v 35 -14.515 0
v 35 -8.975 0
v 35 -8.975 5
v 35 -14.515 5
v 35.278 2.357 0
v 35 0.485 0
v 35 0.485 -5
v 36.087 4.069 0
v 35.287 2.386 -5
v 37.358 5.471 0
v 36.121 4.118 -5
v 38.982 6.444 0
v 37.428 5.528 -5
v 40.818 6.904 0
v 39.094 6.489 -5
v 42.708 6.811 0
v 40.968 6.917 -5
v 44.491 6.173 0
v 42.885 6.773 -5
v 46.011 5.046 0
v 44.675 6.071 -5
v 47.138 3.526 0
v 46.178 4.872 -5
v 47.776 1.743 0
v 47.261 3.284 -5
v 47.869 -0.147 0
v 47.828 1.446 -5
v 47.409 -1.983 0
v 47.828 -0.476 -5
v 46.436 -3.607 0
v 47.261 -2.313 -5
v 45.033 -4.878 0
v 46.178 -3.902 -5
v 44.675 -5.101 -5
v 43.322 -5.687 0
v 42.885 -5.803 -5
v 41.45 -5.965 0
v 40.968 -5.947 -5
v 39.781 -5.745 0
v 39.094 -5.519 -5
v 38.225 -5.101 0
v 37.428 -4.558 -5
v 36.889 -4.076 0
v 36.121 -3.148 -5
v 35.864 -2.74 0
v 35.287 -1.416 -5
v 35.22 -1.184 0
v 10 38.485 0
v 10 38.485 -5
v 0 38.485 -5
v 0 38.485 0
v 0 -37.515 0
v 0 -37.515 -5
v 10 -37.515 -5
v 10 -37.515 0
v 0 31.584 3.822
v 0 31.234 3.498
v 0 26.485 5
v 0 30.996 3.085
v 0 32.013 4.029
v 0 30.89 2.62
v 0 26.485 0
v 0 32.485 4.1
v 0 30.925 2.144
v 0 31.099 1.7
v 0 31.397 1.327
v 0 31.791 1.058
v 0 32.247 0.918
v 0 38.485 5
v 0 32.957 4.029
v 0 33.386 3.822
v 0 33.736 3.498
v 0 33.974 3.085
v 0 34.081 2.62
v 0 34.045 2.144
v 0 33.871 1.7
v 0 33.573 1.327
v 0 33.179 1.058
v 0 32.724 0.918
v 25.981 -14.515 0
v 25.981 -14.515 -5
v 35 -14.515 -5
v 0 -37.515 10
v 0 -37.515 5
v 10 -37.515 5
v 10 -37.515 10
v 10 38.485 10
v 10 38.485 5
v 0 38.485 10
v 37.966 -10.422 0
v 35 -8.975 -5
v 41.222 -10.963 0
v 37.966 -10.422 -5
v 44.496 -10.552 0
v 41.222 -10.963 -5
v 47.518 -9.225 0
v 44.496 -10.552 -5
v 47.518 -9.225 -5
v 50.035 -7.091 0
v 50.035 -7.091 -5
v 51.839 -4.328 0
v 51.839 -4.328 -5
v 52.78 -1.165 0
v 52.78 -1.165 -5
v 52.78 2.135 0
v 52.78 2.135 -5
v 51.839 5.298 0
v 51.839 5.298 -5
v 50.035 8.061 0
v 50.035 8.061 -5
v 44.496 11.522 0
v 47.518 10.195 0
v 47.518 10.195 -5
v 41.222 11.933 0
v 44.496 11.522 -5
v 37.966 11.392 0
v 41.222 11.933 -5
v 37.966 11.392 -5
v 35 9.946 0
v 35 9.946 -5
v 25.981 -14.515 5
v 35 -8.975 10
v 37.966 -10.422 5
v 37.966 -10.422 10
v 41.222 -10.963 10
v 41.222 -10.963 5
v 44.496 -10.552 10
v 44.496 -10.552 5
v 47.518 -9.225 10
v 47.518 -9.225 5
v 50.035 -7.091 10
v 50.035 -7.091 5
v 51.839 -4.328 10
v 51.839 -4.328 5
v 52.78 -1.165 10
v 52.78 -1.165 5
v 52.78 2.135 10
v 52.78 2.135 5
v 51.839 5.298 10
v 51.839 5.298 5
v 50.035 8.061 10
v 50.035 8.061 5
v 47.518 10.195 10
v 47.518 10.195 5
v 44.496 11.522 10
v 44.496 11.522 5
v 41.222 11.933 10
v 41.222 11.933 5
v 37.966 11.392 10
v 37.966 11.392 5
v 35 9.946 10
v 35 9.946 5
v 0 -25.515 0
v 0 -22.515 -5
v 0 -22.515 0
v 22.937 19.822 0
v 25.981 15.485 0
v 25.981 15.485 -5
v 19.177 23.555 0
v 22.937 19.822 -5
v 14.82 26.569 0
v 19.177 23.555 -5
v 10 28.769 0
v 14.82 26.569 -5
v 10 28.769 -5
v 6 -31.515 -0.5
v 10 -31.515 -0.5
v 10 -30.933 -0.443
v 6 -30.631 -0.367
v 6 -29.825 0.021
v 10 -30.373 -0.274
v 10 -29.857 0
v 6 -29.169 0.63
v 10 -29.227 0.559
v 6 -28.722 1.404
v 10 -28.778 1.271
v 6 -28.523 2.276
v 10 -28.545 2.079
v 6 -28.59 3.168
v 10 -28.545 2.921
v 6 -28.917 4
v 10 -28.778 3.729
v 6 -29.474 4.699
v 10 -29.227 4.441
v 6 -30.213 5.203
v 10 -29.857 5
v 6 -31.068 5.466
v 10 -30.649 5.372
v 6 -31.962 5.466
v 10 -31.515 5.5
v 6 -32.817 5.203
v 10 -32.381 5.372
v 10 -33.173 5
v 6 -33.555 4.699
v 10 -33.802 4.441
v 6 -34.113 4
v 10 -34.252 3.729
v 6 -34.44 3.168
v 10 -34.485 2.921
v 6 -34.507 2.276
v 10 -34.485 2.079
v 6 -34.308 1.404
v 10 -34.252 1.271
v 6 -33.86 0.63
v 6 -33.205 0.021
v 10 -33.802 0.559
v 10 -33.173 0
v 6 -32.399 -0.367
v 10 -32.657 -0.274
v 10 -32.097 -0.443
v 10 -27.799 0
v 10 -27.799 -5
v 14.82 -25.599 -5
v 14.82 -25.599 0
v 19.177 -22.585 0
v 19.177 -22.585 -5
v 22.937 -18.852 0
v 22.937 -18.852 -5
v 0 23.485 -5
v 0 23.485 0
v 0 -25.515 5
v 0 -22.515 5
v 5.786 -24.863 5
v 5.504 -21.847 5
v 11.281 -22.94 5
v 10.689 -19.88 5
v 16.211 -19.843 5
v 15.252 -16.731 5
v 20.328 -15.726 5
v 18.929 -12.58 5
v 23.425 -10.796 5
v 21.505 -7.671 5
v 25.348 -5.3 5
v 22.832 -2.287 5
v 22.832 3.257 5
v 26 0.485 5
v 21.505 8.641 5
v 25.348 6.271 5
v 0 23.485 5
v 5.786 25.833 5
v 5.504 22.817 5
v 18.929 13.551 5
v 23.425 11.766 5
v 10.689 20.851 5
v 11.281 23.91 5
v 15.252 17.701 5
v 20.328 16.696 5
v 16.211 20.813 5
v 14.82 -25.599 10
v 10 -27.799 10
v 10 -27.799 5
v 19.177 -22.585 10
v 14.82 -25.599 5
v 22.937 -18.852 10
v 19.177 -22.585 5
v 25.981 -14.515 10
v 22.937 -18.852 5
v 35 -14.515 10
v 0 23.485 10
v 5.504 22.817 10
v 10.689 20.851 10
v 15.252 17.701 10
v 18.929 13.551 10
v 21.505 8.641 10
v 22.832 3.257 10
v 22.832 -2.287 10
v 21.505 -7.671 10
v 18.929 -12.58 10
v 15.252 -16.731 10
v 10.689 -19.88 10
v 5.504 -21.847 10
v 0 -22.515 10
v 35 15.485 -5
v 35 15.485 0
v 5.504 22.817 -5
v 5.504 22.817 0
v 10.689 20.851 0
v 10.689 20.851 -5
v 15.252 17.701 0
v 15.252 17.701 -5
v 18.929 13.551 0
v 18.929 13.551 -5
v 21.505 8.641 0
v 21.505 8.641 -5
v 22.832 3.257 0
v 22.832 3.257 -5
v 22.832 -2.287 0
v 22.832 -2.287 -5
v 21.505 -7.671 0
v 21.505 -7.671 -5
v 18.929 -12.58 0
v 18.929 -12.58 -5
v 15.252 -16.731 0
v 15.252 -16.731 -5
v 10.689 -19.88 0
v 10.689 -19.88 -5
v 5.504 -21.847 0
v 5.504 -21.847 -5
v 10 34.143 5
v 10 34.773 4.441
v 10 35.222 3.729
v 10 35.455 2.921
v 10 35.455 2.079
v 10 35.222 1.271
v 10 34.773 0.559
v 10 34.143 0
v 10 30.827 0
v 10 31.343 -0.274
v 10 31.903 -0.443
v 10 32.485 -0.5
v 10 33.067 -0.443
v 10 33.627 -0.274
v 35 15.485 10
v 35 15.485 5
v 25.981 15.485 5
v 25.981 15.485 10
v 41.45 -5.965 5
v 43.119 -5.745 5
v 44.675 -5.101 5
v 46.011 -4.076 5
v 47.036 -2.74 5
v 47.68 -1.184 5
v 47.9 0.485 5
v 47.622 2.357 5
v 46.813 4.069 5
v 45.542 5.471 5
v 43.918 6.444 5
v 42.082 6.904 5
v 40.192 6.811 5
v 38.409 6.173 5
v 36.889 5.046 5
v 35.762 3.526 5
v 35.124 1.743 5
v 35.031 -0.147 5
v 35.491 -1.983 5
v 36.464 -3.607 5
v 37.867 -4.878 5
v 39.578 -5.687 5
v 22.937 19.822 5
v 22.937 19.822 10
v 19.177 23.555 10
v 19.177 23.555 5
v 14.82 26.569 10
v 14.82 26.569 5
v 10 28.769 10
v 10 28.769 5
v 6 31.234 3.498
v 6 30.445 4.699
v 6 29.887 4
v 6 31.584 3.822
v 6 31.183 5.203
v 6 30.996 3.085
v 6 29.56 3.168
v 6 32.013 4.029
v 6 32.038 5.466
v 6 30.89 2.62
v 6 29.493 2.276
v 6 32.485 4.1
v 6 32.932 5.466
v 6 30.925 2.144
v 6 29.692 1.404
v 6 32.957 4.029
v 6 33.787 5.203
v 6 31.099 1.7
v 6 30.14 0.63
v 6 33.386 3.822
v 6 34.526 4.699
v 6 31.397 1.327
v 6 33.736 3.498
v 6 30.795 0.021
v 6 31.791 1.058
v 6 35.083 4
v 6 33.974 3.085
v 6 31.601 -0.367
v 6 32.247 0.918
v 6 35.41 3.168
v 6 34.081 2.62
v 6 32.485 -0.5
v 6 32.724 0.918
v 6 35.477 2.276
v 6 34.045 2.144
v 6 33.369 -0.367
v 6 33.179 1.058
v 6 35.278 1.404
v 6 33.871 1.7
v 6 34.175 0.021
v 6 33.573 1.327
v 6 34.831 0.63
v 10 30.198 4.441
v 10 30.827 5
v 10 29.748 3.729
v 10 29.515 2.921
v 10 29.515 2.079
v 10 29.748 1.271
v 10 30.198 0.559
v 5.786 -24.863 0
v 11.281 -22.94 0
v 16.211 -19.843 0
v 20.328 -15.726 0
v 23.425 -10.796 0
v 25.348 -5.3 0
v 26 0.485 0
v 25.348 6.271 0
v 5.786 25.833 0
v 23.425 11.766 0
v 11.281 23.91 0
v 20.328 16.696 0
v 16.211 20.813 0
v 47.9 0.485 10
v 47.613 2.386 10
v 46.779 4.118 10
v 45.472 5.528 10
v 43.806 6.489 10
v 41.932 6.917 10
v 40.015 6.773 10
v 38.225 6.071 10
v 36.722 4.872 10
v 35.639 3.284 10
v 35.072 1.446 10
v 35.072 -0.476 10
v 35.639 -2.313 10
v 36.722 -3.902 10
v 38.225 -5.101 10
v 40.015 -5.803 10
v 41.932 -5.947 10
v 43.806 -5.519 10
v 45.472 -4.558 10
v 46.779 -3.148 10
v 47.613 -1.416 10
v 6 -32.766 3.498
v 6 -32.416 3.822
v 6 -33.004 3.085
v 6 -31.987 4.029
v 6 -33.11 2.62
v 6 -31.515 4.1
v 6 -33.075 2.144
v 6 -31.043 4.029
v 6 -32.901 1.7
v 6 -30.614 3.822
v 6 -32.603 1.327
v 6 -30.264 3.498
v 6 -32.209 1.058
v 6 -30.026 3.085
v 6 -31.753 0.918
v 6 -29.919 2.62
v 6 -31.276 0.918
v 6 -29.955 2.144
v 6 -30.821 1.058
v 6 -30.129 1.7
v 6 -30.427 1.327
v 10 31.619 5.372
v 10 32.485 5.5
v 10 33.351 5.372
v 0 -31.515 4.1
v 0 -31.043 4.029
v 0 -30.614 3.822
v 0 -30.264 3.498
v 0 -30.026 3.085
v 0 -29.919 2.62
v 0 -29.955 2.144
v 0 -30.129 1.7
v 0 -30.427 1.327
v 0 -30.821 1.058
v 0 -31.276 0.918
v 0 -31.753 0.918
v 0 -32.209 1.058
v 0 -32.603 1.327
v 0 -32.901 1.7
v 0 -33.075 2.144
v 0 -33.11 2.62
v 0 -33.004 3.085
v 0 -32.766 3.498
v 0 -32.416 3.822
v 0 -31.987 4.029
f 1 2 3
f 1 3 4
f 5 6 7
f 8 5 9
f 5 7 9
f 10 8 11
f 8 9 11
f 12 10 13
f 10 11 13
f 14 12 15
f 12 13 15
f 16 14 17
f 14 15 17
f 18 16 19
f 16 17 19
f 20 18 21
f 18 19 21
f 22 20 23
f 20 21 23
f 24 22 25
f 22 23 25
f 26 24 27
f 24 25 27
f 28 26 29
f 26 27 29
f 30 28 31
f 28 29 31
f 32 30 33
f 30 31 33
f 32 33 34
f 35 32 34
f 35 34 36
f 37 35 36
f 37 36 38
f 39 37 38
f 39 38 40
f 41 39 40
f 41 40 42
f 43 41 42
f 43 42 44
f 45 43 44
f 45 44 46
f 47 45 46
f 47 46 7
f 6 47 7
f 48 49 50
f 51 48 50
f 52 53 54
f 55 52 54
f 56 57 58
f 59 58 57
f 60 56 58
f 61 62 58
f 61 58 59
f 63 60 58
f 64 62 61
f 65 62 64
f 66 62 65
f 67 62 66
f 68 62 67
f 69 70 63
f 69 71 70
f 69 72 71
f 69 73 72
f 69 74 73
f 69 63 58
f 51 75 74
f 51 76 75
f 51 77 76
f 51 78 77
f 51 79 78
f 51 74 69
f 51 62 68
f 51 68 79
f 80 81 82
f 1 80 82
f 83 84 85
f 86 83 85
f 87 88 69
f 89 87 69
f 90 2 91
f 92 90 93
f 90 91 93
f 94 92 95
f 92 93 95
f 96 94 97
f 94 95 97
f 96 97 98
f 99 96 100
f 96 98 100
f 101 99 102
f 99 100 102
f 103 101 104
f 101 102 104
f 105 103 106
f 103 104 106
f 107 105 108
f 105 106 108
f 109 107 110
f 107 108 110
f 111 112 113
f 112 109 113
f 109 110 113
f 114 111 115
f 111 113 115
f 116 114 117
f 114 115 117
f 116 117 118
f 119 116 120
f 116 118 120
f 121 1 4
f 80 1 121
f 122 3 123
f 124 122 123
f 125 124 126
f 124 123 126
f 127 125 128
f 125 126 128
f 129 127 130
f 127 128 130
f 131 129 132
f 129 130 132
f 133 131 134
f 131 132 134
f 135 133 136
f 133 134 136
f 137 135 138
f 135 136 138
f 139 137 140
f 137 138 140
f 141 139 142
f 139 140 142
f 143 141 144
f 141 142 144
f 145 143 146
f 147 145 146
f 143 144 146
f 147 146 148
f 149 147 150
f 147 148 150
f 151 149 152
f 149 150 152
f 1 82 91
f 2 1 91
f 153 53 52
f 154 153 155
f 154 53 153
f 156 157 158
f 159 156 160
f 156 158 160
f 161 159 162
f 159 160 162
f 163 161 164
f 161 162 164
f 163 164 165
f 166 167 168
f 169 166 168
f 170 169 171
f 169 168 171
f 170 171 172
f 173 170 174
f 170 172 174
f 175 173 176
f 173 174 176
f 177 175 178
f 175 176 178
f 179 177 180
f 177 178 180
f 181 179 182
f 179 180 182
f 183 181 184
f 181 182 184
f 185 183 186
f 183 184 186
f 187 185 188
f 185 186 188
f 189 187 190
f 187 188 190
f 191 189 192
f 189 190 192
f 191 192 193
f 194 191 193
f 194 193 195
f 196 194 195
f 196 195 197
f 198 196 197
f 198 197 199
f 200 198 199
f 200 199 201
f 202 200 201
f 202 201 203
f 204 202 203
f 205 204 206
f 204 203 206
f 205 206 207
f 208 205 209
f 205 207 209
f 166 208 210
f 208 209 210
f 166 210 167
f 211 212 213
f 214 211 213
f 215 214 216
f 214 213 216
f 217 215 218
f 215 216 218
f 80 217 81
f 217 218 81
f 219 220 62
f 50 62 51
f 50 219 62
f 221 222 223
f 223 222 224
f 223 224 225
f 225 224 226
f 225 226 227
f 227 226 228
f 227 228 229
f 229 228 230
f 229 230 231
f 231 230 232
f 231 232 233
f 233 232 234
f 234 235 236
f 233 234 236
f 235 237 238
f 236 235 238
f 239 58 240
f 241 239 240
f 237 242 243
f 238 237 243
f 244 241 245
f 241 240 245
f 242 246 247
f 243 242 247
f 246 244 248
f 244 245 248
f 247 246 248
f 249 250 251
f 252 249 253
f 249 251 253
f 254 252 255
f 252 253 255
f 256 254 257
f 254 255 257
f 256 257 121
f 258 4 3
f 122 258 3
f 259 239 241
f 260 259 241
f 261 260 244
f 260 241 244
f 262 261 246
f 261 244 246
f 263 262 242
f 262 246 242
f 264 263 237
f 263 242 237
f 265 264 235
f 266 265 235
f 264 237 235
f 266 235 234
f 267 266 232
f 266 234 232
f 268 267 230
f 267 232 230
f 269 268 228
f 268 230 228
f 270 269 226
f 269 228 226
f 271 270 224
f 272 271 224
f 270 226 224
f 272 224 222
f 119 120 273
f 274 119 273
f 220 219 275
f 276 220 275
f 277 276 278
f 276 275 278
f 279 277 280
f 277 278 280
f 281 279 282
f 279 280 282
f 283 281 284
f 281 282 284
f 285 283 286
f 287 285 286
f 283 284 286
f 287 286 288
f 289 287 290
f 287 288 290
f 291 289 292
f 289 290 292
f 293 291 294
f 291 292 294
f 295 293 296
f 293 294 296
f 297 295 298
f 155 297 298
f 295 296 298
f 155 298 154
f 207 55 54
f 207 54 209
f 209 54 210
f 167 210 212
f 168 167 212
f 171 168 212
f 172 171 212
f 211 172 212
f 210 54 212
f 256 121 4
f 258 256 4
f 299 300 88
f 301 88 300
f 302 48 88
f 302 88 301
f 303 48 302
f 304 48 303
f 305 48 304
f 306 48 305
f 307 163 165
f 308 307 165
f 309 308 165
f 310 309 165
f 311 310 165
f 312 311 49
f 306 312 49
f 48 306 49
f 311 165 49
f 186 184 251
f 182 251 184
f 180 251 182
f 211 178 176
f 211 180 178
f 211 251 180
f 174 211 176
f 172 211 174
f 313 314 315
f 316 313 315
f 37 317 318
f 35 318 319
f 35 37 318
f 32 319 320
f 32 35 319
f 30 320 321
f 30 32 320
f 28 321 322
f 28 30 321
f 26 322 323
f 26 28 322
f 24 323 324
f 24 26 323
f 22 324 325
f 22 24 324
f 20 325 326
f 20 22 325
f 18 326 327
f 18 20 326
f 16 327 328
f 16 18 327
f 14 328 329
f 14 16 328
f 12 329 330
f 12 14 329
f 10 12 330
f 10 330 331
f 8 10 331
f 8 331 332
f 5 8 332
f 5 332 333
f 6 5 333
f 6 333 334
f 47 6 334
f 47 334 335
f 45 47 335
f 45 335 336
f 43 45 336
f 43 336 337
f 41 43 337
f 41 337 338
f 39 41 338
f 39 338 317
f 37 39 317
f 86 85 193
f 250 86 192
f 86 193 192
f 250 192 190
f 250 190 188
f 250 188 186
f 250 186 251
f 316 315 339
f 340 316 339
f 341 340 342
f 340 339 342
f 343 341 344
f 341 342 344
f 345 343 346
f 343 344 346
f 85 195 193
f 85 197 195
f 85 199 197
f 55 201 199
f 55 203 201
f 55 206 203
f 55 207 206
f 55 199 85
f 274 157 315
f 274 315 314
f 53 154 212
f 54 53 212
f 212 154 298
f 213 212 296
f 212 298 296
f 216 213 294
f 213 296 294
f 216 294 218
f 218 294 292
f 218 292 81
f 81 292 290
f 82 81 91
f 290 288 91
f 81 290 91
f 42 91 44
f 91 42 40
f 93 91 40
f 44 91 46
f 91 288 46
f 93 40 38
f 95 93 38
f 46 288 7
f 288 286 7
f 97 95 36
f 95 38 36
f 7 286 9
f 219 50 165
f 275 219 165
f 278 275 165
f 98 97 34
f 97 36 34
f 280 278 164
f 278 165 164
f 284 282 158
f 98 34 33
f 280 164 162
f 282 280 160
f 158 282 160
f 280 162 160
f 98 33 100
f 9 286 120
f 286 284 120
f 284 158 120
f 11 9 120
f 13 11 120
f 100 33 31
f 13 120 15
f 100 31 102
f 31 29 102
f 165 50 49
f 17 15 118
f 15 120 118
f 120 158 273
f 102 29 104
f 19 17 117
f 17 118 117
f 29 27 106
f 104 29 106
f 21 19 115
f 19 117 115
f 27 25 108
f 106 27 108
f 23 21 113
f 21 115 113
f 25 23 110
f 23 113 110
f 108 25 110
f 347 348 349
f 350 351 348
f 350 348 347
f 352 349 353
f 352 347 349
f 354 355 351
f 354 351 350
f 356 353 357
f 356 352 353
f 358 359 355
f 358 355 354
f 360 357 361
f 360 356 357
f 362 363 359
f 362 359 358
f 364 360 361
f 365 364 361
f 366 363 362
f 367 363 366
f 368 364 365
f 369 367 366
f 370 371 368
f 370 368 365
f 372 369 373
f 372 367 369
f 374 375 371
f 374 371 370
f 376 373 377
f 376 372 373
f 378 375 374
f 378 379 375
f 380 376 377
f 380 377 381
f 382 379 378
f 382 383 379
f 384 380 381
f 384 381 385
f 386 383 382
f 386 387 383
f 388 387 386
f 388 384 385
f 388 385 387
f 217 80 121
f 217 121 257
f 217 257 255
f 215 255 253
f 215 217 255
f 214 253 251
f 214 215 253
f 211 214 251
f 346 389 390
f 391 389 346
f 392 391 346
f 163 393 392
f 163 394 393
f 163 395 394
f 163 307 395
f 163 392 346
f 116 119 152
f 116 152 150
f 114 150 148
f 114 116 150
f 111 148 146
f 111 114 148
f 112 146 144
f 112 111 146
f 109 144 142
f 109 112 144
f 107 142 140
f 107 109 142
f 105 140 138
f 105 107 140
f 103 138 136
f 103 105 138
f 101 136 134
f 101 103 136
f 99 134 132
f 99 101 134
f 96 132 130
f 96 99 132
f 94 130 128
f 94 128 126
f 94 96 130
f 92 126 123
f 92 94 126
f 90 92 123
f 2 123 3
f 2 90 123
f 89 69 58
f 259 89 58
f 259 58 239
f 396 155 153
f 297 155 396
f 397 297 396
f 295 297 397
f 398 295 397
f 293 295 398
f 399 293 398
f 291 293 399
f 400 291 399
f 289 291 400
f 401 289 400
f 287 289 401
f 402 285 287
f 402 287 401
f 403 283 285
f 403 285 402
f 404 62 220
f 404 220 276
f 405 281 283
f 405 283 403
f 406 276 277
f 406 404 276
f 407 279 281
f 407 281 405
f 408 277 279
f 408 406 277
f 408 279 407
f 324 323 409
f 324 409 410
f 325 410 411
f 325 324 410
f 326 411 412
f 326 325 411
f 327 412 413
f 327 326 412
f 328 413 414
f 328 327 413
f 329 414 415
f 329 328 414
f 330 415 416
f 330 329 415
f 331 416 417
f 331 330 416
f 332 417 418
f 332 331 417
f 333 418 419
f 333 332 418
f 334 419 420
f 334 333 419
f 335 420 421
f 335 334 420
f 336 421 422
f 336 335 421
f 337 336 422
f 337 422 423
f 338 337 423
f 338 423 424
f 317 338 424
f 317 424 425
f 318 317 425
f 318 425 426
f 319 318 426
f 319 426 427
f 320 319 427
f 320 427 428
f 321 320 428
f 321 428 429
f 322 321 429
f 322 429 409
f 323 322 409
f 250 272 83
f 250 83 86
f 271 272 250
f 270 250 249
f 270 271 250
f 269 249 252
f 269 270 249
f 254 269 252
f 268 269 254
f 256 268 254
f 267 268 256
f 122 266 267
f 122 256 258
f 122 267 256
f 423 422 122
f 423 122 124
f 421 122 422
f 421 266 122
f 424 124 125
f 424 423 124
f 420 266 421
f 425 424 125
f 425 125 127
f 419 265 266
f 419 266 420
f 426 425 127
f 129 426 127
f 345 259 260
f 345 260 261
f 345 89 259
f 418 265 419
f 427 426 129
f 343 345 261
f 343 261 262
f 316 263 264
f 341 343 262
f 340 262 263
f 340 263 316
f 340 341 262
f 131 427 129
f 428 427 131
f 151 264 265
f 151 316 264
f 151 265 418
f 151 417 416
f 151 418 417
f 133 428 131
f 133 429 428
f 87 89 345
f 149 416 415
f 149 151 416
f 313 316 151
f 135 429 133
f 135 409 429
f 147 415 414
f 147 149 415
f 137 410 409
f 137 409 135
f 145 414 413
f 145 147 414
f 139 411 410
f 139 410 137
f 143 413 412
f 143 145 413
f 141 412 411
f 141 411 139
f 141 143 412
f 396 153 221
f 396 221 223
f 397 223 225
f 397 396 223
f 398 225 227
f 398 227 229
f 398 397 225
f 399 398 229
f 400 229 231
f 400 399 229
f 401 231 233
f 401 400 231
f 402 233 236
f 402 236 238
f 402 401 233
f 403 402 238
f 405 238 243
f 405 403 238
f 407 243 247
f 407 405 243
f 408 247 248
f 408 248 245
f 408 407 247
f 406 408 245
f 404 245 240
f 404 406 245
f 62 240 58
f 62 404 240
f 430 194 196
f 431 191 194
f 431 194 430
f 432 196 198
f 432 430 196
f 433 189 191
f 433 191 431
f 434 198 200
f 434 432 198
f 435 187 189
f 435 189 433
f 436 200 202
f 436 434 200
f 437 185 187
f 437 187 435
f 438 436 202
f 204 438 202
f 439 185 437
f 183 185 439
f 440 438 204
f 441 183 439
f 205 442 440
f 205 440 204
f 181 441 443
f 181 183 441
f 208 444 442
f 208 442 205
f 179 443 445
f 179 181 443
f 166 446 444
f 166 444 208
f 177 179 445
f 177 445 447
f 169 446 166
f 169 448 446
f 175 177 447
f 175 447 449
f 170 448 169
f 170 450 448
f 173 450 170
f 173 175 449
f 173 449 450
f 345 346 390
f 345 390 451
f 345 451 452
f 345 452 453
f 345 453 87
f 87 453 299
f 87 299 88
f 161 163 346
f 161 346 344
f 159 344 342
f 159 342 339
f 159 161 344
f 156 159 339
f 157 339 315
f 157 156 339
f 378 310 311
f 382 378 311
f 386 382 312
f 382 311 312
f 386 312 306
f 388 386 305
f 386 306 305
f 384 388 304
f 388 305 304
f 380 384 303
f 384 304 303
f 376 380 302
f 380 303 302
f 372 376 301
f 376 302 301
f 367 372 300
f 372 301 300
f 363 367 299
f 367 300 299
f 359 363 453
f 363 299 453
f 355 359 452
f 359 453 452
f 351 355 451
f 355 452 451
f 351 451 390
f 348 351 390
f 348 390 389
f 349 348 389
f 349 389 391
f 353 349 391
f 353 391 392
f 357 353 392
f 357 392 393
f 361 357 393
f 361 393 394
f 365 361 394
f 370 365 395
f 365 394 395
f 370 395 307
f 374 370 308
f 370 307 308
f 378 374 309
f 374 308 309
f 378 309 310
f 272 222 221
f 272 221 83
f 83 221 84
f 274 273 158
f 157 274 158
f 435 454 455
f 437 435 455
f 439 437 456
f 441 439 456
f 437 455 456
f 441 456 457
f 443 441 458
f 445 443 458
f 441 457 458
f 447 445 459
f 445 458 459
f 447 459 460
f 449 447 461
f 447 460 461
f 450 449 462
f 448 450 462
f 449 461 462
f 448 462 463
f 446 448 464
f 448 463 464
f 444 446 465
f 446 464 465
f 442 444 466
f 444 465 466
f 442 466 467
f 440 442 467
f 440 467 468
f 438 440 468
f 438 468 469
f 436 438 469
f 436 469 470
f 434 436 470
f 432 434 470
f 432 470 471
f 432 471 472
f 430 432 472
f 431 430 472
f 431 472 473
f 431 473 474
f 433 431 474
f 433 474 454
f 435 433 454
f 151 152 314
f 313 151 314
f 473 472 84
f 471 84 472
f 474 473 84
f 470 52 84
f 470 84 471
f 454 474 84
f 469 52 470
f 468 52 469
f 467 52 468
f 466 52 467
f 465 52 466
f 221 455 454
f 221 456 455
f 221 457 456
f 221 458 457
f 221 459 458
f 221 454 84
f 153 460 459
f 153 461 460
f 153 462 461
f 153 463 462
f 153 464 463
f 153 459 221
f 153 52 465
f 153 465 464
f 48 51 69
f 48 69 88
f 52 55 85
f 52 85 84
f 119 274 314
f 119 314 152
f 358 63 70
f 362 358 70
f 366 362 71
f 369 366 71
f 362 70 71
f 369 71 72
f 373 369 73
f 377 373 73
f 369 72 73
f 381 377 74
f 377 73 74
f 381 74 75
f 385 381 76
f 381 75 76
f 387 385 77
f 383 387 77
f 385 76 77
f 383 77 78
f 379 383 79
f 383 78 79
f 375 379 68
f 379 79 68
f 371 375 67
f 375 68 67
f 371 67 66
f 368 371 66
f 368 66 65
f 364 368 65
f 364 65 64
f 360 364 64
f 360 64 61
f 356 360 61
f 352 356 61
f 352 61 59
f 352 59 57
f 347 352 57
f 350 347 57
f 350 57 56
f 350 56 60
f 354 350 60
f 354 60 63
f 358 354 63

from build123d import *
from build123d.topology import SkipClean

# Parameters (mm, degrees)
BOSS_EXTRUDE1_DEPTH = 5
SKETCH2_R           = 6.45
BOSS_EXTRUDE2_DEPTH = 5
BOSS_EXTRUDE4_START = 5
SKETCH3_R           = 6.45
BOSS_EXTRUDE4_DEPTH = 5
SKETCH7_R           = 1.6
CUT_EXTRUDE1_DEPTH  = 15
SKETCH9_R           = 3
CUT_EXTRUDE3_DEPTH  = 4


with BuildPart() as part:
    # Sketch1 → Boss-Extrude1 (new body)
    with BuildSketch(Plane.XY):
        with BuildLine():
            Line((0, 26.485074627), (0, 30.485074627))
            Line((0, 30.485074627), (0, 38.485074627))
            Line((0, 38.485074627), (10, 38.485074627))
            Line((10, 38.485074627), (10, 28.769345874))
            ThreePointArc((10, 28.769345874), (19.177376677, 23.555146664), (25.980762114, 15.485074627))
            Line((25.980762114, 15.485074627), (35, 15.485074627))
            Line((35, 15.485074627), (35, 9.945518591))
            ThreePointArc((35, 9.945518591), (52.9, 0.485074627), (35, -8.975369337))
            Line((35, -8.975369337), (35, -14.514925373))
            Line((35, -14.514925373), (25.980762114, -14.514925373))
            ThreePointArc((25.980762114, -14.514925373), (19.177376677, -22.58499741), (10, -27.799196621))
            Line((10, -27.799196621), (10, -37.514925373))
            Line((10, -37.514925373), (0, -37.514925373))
            Line((0, -37.514925373), (0, -29.514925373))
            Line((0, -29.514925373), (0, -25.514925373))
            ThreePointArc((0, -25.514925373), (26, 0.485074627), (0, 26.485074627))
        make_face()
        with BuildLine():
            ThreePointArc((41.45, 6.935074627), (35, 0.485074627), (41.45, -5.964925373))
            ThreePointArc((41.45, -5.964925373), (47.9, 0.485074627), (41.45, 6.935074627))
        make_face(mode=Mode.SUBTRACT)
    extrude(amount=BOSS_EXTRUDE1_DEPTH)

    # Sketch2 → Boss-Extrude2 (add)
    with SkipClean():  # the faces are left unmerged after this step: merging them gives an invalid solid
        with BuildSketch(Plane.XY.offset(5)):
            with BuildLine():
                Line((0, 26.485074627), (0, 23.485074627))
                ThreePointArc((0, 23.485074627), (23, 0.485074627), (0, -22.514925373))
                Line((0, -22.514925373), (0, -25.514925373))
                Line((0, -25.514925373), (0, -29.514925373))
                Line((0, -29.514925373), (0, -37.514925373))
                Line((0, -37.514925373), (10, -37.514925373))
                Line((10, -37.514925373), (10, -27.799196621))
                ThreePointArc((10, -27.799196621), (19.177376677, -22.58499741), (25.980762114, -14.514925373))
                Line((25.980762114, -14.514925373), (35, -14.514925373))
                Line((35, -14.514925373), (35, -8.975369337))
                ThreePointArc((35, -8.975369337), (52.9, 0.485074627), (35, 9.945518591))
                Line((35, 9.945518591), (35, 15.485074627))
                Line((35, 15.485074627), (25.980762114, 15.485074627))
                ThreePointArc((25.980762114, 15.485074627), (19.177376677, 23.555146664), (10, 28.769345874))
                Line((10, 28.769345874), (10, 38.485074627))
                Line((10, 38.485074627), (0, 38.485074627))
                Line((0, 38.485074627), (0, 30.485074627))
                Line((0, 30.485074627), (0, 26.485074627))
            make_face()
            with Locations((41.45, 0.485074627)):
                Circle(SKETCH2_R, mode=Mode.SUBTRACT)
        extrude(amount=BOSS_EXTRUDE2_DEPTH)

    # Sketch3 → Boss-Extrude4 (add)
    with SkipClean():  # the faces are left unmerged after this step: merging them gives an invalid solid
        with BuildSketch(Plane(origin=(0, 0, 0), x_dir=(-1, 0, 0), z_dir=(0, 0, -1)).offset(BOSS_EXTRUDE4_START)):
            with BuildLine():
                Line((0, -22.514925373), (0, -29.514925373))
                Line((0, -29.514925373), (0, -37.514925373))
                Line((0, -37.514925373), (-10, -37.514925373))
                Line((-10, -37.514925373), (-10, -27.799196621))
                ThreePointArc((-10, -27.799196621), (-19.177376677, -22.58499741), (-25.980762114, -14.514925373))
                Line((-25.980762114, -14.514925373), (-35, -14.514925373))
                Line((-35, -14.514925373), (-35, -8.975369337))
                ThreePointArc((-35, -8.975369337), (-52.9, 0.485074627), (-35, 9.945518591))
                Line((-35, 9.945518591), (-35, 15.485074627))
                Line((-35, 15.485074627), (-25.980762114, 15.485074627))
                ThreePointArc((-25.980762114, 15.485074627), (-19.177376677, 23.555146664), (-10, 28.769345874))
                Line((-10, 28.769345874), (-10, 38.485074627))
                Line((-10, 38.485074627), (0, 38.485074627))
                Line((0, 38.485074627), (0, 30.485074627))
                Line((0, 30.485074627), (0, 23.485074627))
                ThreePointArc((0, 23.485074627), (-23, 0.485074627), (0, -22.514925373))
            make_face()
            with Locations((-41.45, 0.485074627)):
                Circle(SKETCH3_R, mode=Mode.SUBTRACT)
        extrude(amount=-BOSS_EXTRUDE4_DEPTH)

    # Sketch7 → Cut-Extrude1 (cut)
    with SkipClean():  # the faces are left unmerged after this step: merging them gives an invalid solid
        with BuildSketch(Plane.ZY):
            with Locations((2.5, 32.485074627)):
                Circle(SKETCH7_R)
            with Locations((2.5, -31.514925373)):
                Circle(SKETCH7_R)
        extrude(amount=-CUT_EXTRUDE1_DEPTH, mode=Mode.SUBTRACT)

    # Sketch9 → Cut-Extrude3 (cut)
    with SkipClean():  # the faces are left unmerged after this step: merging them gives an invalid solid
        with BuildSketch(Plane(origin=(10, 0, 0), x_dir=(0, 0, -1), z_dir=(1, 0, 0))):
            with Locations((-2.5, -31.514925373)):
                Circle(SKETCH9_R)
            with Locations((-2.5, 32.485074627)):
                Circle(SKETCH9_R)
        extrude(amount=-CUT_EXTRUDE3_DEPTH, mode=Mode.SUBTRACT)


solid = part.part
